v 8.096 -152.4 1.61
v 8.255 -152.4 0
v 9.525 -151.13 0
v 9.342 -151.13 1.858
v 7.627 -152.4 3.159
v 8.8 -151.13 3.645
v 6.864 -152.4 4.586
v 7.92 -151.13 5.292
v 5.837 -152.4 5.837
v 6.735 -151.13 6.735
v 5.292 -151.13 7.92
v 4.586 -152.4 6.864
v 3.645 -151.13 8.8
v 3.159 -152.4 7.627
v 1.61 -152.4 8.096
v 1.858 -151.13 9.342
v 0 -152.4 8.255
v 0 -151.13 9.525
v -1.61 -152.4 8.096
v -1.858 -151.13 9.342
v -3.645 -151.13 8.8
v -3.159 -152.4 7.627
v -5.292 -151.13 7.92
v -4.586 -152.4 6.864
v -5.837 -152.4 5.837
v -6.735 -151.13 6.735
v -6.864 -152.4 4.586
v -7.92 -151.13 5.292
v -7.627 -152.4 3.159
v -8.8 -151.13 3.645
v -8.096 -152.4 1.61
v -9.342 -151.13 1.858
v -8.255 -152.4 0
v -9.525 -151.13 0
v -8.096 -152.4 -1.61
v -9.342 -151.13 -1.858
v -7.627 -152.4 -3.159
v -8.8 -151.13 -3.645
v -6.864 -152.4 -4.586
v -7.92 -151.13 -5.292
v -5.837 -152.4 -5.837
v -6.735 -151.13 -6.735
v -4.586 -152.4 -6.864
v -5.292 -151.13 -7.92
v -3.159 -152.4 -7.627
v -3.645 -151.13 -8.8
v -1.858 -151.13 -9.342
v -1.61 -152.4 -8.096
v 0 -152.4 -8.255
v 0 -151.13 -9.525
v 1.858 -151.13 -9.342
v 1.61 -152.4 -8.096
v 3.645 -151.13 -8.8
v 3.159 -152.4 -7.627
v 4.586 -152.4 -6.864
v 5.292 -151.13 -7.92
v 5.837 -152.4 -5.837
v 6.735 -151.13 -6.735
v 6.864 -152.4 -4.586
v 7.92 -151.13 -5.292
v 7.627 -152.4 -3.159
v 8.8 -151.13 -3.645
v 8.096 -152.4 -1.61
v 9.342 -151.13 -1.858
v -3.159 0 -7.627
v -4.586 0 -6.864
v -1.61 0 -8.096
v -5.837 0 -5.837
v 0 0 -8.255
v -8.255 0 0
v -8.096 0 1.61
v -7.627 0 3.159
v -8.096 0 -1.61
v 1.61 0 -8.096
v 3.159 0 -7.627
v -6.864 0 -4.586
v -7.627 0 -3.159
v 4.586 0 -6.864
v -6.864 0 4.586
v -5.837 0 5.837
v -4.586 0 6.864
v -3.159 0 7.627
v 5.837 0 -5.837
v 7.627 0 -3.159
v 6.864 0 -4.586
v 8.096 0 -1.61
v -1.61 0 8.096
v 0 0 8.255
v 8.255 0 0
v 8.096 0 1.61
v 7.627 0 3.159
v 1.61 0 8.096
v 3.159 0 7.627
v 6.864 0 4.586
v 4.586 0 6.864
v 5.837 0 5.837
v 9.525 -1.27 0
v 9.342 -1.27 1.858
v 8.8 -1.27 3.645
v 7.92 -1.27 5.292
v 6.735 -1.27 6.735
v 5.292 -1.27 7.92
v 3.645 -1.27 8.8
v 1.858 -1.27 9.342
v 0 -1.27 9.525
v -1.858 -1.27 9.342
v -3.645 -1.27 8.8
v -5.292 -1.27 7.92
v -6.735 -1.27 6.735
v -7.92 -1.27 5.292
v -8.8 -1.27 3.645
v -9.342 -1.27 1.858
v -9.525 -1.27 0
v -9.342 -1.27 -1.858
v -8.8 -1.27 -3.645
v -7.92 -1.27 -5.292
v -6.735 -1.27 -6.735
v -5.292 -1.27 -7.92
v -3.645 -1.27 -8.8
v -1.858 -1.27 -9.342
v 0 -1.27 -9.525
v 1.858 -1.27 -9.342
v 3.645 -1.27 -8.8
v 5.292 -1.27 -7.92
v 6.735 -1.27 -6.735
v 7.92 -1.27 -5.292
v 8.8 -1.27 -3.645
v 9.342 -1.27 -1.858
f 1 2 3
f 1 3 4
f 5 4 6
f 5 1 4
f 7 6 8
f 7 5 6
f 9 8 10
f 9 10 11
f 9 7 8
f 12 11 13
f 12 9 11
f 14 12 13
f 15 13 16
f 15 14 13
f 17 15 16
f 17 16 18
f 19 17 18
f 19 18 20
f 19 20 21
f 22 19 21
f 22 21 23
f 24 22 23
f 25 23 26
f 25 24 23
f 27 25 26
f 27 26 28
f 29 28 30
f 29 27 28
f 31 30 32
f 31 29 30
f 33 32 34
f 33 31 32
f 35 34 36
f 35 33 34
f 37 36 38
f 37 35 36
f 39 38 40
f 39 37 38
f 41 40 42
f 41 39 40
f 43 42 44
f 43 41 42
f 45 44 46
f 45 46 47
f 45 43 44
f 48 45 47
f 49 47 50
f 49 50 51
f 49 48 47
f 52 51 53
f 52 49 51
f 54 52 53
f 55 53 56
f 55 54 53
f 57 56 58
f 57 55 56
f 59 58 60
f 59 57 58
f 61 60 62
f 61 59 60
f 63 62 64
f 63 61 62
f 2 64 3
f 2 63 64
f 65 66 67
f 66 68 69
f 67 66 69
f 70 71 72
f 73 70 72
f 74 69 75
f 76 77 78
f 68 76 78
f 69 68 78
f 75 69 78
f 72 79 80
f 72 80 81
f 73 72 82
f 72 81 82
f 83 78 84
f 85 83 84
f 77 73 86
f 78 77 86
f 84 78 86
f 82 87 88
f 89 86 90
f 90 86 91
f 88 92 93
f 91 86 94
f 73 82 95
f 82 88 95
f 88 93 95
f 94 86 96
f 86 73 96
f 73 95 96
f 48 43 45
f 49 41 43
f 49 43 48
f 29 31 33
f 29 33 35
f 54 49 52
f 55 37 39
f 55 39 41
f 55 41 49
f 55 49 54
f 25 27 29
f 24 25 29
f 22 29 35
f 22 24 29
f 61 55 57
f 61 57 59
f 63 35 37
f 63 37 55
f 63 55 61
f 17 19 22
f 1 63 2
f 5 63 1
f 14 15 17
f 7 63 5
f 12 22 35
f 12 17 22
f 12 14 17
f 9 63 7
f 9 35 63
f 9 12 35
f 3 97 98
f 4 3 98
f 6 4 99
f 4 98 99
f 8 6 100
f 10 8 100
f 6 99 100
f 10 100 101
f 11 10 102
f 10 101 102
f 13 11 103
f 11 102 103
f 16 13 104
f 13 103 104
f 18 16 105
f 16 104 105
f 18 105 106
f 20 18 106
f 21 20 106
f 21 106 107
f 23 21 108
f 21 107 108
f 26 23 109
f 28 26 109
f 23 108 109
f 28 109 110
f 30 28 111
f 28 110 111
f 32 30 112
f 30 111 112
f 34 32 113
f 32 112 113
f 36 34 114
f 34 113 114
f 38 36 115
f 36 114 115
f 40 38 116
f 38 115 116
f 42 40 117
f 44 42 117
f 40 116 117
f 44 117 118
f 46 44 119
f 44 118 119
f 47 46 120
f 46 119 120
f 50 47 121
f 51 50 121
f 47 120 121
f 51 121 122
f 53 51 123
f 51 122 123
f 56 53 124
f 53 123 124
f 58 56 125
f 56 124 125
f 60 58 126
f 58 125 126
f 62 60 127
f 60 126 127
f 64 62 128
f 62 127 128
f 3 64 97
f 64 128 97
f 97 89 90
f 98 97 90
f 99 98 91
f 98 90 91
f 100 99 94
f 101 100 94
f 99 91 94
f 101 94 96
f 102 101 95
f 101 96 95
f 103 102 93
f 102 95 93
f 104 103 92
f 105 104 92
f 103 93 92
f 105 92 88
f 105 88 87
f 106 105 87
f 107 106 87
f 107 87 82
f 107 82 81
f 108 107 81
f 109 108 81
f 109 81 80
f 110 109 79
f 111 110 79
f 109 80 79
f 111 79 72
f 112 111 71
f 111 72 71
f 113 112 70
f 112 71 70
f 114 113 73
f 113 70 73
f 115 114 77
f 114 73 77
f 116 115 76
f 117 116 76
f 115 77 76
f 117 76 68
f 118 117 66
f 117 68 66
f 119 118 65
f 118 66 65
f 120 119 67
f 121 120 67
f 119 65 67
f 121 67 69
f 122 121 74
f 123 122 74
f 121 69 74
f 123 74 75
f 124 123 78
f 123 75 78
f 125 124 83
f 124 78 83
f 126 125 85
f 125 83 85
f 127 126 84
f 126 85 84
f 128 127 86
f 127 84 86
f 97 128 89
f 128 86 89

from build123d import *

# Parameters (mm, degrees)
F0_R     = 9.525
F1_DEPTH = 152.4
F2_SIZE2 = 1.27
F2_SIZE  = 1.27
F3_SIZE2 = 1.27
F3_SIZE  = 1.27


with BuildPart() as f1:
    # F0 (on Front) → F1 (new body)
    with BuildSketch(Plane.XZ):
        Circle(F0_R)
    extrude(amount=F1_DEPTH)

    # F2
    f2_edges = [f1.edges().sort_by_distance(p)[0] for p in [
        (-9.525, 0, 0),
    ]]
    chamfer(f2_edges, length=F2_SIZE, length2=F2_SIZE2)

    # F3
    f3_edges = [f1.edges().sort_by_distance(p)[0] for p in [
        (-9.525, -152.4, 0),
    ]]
    chamfer(f3_edges, length=F3_SIZE, length2=F3_SIZE2)


solid = f1.part
